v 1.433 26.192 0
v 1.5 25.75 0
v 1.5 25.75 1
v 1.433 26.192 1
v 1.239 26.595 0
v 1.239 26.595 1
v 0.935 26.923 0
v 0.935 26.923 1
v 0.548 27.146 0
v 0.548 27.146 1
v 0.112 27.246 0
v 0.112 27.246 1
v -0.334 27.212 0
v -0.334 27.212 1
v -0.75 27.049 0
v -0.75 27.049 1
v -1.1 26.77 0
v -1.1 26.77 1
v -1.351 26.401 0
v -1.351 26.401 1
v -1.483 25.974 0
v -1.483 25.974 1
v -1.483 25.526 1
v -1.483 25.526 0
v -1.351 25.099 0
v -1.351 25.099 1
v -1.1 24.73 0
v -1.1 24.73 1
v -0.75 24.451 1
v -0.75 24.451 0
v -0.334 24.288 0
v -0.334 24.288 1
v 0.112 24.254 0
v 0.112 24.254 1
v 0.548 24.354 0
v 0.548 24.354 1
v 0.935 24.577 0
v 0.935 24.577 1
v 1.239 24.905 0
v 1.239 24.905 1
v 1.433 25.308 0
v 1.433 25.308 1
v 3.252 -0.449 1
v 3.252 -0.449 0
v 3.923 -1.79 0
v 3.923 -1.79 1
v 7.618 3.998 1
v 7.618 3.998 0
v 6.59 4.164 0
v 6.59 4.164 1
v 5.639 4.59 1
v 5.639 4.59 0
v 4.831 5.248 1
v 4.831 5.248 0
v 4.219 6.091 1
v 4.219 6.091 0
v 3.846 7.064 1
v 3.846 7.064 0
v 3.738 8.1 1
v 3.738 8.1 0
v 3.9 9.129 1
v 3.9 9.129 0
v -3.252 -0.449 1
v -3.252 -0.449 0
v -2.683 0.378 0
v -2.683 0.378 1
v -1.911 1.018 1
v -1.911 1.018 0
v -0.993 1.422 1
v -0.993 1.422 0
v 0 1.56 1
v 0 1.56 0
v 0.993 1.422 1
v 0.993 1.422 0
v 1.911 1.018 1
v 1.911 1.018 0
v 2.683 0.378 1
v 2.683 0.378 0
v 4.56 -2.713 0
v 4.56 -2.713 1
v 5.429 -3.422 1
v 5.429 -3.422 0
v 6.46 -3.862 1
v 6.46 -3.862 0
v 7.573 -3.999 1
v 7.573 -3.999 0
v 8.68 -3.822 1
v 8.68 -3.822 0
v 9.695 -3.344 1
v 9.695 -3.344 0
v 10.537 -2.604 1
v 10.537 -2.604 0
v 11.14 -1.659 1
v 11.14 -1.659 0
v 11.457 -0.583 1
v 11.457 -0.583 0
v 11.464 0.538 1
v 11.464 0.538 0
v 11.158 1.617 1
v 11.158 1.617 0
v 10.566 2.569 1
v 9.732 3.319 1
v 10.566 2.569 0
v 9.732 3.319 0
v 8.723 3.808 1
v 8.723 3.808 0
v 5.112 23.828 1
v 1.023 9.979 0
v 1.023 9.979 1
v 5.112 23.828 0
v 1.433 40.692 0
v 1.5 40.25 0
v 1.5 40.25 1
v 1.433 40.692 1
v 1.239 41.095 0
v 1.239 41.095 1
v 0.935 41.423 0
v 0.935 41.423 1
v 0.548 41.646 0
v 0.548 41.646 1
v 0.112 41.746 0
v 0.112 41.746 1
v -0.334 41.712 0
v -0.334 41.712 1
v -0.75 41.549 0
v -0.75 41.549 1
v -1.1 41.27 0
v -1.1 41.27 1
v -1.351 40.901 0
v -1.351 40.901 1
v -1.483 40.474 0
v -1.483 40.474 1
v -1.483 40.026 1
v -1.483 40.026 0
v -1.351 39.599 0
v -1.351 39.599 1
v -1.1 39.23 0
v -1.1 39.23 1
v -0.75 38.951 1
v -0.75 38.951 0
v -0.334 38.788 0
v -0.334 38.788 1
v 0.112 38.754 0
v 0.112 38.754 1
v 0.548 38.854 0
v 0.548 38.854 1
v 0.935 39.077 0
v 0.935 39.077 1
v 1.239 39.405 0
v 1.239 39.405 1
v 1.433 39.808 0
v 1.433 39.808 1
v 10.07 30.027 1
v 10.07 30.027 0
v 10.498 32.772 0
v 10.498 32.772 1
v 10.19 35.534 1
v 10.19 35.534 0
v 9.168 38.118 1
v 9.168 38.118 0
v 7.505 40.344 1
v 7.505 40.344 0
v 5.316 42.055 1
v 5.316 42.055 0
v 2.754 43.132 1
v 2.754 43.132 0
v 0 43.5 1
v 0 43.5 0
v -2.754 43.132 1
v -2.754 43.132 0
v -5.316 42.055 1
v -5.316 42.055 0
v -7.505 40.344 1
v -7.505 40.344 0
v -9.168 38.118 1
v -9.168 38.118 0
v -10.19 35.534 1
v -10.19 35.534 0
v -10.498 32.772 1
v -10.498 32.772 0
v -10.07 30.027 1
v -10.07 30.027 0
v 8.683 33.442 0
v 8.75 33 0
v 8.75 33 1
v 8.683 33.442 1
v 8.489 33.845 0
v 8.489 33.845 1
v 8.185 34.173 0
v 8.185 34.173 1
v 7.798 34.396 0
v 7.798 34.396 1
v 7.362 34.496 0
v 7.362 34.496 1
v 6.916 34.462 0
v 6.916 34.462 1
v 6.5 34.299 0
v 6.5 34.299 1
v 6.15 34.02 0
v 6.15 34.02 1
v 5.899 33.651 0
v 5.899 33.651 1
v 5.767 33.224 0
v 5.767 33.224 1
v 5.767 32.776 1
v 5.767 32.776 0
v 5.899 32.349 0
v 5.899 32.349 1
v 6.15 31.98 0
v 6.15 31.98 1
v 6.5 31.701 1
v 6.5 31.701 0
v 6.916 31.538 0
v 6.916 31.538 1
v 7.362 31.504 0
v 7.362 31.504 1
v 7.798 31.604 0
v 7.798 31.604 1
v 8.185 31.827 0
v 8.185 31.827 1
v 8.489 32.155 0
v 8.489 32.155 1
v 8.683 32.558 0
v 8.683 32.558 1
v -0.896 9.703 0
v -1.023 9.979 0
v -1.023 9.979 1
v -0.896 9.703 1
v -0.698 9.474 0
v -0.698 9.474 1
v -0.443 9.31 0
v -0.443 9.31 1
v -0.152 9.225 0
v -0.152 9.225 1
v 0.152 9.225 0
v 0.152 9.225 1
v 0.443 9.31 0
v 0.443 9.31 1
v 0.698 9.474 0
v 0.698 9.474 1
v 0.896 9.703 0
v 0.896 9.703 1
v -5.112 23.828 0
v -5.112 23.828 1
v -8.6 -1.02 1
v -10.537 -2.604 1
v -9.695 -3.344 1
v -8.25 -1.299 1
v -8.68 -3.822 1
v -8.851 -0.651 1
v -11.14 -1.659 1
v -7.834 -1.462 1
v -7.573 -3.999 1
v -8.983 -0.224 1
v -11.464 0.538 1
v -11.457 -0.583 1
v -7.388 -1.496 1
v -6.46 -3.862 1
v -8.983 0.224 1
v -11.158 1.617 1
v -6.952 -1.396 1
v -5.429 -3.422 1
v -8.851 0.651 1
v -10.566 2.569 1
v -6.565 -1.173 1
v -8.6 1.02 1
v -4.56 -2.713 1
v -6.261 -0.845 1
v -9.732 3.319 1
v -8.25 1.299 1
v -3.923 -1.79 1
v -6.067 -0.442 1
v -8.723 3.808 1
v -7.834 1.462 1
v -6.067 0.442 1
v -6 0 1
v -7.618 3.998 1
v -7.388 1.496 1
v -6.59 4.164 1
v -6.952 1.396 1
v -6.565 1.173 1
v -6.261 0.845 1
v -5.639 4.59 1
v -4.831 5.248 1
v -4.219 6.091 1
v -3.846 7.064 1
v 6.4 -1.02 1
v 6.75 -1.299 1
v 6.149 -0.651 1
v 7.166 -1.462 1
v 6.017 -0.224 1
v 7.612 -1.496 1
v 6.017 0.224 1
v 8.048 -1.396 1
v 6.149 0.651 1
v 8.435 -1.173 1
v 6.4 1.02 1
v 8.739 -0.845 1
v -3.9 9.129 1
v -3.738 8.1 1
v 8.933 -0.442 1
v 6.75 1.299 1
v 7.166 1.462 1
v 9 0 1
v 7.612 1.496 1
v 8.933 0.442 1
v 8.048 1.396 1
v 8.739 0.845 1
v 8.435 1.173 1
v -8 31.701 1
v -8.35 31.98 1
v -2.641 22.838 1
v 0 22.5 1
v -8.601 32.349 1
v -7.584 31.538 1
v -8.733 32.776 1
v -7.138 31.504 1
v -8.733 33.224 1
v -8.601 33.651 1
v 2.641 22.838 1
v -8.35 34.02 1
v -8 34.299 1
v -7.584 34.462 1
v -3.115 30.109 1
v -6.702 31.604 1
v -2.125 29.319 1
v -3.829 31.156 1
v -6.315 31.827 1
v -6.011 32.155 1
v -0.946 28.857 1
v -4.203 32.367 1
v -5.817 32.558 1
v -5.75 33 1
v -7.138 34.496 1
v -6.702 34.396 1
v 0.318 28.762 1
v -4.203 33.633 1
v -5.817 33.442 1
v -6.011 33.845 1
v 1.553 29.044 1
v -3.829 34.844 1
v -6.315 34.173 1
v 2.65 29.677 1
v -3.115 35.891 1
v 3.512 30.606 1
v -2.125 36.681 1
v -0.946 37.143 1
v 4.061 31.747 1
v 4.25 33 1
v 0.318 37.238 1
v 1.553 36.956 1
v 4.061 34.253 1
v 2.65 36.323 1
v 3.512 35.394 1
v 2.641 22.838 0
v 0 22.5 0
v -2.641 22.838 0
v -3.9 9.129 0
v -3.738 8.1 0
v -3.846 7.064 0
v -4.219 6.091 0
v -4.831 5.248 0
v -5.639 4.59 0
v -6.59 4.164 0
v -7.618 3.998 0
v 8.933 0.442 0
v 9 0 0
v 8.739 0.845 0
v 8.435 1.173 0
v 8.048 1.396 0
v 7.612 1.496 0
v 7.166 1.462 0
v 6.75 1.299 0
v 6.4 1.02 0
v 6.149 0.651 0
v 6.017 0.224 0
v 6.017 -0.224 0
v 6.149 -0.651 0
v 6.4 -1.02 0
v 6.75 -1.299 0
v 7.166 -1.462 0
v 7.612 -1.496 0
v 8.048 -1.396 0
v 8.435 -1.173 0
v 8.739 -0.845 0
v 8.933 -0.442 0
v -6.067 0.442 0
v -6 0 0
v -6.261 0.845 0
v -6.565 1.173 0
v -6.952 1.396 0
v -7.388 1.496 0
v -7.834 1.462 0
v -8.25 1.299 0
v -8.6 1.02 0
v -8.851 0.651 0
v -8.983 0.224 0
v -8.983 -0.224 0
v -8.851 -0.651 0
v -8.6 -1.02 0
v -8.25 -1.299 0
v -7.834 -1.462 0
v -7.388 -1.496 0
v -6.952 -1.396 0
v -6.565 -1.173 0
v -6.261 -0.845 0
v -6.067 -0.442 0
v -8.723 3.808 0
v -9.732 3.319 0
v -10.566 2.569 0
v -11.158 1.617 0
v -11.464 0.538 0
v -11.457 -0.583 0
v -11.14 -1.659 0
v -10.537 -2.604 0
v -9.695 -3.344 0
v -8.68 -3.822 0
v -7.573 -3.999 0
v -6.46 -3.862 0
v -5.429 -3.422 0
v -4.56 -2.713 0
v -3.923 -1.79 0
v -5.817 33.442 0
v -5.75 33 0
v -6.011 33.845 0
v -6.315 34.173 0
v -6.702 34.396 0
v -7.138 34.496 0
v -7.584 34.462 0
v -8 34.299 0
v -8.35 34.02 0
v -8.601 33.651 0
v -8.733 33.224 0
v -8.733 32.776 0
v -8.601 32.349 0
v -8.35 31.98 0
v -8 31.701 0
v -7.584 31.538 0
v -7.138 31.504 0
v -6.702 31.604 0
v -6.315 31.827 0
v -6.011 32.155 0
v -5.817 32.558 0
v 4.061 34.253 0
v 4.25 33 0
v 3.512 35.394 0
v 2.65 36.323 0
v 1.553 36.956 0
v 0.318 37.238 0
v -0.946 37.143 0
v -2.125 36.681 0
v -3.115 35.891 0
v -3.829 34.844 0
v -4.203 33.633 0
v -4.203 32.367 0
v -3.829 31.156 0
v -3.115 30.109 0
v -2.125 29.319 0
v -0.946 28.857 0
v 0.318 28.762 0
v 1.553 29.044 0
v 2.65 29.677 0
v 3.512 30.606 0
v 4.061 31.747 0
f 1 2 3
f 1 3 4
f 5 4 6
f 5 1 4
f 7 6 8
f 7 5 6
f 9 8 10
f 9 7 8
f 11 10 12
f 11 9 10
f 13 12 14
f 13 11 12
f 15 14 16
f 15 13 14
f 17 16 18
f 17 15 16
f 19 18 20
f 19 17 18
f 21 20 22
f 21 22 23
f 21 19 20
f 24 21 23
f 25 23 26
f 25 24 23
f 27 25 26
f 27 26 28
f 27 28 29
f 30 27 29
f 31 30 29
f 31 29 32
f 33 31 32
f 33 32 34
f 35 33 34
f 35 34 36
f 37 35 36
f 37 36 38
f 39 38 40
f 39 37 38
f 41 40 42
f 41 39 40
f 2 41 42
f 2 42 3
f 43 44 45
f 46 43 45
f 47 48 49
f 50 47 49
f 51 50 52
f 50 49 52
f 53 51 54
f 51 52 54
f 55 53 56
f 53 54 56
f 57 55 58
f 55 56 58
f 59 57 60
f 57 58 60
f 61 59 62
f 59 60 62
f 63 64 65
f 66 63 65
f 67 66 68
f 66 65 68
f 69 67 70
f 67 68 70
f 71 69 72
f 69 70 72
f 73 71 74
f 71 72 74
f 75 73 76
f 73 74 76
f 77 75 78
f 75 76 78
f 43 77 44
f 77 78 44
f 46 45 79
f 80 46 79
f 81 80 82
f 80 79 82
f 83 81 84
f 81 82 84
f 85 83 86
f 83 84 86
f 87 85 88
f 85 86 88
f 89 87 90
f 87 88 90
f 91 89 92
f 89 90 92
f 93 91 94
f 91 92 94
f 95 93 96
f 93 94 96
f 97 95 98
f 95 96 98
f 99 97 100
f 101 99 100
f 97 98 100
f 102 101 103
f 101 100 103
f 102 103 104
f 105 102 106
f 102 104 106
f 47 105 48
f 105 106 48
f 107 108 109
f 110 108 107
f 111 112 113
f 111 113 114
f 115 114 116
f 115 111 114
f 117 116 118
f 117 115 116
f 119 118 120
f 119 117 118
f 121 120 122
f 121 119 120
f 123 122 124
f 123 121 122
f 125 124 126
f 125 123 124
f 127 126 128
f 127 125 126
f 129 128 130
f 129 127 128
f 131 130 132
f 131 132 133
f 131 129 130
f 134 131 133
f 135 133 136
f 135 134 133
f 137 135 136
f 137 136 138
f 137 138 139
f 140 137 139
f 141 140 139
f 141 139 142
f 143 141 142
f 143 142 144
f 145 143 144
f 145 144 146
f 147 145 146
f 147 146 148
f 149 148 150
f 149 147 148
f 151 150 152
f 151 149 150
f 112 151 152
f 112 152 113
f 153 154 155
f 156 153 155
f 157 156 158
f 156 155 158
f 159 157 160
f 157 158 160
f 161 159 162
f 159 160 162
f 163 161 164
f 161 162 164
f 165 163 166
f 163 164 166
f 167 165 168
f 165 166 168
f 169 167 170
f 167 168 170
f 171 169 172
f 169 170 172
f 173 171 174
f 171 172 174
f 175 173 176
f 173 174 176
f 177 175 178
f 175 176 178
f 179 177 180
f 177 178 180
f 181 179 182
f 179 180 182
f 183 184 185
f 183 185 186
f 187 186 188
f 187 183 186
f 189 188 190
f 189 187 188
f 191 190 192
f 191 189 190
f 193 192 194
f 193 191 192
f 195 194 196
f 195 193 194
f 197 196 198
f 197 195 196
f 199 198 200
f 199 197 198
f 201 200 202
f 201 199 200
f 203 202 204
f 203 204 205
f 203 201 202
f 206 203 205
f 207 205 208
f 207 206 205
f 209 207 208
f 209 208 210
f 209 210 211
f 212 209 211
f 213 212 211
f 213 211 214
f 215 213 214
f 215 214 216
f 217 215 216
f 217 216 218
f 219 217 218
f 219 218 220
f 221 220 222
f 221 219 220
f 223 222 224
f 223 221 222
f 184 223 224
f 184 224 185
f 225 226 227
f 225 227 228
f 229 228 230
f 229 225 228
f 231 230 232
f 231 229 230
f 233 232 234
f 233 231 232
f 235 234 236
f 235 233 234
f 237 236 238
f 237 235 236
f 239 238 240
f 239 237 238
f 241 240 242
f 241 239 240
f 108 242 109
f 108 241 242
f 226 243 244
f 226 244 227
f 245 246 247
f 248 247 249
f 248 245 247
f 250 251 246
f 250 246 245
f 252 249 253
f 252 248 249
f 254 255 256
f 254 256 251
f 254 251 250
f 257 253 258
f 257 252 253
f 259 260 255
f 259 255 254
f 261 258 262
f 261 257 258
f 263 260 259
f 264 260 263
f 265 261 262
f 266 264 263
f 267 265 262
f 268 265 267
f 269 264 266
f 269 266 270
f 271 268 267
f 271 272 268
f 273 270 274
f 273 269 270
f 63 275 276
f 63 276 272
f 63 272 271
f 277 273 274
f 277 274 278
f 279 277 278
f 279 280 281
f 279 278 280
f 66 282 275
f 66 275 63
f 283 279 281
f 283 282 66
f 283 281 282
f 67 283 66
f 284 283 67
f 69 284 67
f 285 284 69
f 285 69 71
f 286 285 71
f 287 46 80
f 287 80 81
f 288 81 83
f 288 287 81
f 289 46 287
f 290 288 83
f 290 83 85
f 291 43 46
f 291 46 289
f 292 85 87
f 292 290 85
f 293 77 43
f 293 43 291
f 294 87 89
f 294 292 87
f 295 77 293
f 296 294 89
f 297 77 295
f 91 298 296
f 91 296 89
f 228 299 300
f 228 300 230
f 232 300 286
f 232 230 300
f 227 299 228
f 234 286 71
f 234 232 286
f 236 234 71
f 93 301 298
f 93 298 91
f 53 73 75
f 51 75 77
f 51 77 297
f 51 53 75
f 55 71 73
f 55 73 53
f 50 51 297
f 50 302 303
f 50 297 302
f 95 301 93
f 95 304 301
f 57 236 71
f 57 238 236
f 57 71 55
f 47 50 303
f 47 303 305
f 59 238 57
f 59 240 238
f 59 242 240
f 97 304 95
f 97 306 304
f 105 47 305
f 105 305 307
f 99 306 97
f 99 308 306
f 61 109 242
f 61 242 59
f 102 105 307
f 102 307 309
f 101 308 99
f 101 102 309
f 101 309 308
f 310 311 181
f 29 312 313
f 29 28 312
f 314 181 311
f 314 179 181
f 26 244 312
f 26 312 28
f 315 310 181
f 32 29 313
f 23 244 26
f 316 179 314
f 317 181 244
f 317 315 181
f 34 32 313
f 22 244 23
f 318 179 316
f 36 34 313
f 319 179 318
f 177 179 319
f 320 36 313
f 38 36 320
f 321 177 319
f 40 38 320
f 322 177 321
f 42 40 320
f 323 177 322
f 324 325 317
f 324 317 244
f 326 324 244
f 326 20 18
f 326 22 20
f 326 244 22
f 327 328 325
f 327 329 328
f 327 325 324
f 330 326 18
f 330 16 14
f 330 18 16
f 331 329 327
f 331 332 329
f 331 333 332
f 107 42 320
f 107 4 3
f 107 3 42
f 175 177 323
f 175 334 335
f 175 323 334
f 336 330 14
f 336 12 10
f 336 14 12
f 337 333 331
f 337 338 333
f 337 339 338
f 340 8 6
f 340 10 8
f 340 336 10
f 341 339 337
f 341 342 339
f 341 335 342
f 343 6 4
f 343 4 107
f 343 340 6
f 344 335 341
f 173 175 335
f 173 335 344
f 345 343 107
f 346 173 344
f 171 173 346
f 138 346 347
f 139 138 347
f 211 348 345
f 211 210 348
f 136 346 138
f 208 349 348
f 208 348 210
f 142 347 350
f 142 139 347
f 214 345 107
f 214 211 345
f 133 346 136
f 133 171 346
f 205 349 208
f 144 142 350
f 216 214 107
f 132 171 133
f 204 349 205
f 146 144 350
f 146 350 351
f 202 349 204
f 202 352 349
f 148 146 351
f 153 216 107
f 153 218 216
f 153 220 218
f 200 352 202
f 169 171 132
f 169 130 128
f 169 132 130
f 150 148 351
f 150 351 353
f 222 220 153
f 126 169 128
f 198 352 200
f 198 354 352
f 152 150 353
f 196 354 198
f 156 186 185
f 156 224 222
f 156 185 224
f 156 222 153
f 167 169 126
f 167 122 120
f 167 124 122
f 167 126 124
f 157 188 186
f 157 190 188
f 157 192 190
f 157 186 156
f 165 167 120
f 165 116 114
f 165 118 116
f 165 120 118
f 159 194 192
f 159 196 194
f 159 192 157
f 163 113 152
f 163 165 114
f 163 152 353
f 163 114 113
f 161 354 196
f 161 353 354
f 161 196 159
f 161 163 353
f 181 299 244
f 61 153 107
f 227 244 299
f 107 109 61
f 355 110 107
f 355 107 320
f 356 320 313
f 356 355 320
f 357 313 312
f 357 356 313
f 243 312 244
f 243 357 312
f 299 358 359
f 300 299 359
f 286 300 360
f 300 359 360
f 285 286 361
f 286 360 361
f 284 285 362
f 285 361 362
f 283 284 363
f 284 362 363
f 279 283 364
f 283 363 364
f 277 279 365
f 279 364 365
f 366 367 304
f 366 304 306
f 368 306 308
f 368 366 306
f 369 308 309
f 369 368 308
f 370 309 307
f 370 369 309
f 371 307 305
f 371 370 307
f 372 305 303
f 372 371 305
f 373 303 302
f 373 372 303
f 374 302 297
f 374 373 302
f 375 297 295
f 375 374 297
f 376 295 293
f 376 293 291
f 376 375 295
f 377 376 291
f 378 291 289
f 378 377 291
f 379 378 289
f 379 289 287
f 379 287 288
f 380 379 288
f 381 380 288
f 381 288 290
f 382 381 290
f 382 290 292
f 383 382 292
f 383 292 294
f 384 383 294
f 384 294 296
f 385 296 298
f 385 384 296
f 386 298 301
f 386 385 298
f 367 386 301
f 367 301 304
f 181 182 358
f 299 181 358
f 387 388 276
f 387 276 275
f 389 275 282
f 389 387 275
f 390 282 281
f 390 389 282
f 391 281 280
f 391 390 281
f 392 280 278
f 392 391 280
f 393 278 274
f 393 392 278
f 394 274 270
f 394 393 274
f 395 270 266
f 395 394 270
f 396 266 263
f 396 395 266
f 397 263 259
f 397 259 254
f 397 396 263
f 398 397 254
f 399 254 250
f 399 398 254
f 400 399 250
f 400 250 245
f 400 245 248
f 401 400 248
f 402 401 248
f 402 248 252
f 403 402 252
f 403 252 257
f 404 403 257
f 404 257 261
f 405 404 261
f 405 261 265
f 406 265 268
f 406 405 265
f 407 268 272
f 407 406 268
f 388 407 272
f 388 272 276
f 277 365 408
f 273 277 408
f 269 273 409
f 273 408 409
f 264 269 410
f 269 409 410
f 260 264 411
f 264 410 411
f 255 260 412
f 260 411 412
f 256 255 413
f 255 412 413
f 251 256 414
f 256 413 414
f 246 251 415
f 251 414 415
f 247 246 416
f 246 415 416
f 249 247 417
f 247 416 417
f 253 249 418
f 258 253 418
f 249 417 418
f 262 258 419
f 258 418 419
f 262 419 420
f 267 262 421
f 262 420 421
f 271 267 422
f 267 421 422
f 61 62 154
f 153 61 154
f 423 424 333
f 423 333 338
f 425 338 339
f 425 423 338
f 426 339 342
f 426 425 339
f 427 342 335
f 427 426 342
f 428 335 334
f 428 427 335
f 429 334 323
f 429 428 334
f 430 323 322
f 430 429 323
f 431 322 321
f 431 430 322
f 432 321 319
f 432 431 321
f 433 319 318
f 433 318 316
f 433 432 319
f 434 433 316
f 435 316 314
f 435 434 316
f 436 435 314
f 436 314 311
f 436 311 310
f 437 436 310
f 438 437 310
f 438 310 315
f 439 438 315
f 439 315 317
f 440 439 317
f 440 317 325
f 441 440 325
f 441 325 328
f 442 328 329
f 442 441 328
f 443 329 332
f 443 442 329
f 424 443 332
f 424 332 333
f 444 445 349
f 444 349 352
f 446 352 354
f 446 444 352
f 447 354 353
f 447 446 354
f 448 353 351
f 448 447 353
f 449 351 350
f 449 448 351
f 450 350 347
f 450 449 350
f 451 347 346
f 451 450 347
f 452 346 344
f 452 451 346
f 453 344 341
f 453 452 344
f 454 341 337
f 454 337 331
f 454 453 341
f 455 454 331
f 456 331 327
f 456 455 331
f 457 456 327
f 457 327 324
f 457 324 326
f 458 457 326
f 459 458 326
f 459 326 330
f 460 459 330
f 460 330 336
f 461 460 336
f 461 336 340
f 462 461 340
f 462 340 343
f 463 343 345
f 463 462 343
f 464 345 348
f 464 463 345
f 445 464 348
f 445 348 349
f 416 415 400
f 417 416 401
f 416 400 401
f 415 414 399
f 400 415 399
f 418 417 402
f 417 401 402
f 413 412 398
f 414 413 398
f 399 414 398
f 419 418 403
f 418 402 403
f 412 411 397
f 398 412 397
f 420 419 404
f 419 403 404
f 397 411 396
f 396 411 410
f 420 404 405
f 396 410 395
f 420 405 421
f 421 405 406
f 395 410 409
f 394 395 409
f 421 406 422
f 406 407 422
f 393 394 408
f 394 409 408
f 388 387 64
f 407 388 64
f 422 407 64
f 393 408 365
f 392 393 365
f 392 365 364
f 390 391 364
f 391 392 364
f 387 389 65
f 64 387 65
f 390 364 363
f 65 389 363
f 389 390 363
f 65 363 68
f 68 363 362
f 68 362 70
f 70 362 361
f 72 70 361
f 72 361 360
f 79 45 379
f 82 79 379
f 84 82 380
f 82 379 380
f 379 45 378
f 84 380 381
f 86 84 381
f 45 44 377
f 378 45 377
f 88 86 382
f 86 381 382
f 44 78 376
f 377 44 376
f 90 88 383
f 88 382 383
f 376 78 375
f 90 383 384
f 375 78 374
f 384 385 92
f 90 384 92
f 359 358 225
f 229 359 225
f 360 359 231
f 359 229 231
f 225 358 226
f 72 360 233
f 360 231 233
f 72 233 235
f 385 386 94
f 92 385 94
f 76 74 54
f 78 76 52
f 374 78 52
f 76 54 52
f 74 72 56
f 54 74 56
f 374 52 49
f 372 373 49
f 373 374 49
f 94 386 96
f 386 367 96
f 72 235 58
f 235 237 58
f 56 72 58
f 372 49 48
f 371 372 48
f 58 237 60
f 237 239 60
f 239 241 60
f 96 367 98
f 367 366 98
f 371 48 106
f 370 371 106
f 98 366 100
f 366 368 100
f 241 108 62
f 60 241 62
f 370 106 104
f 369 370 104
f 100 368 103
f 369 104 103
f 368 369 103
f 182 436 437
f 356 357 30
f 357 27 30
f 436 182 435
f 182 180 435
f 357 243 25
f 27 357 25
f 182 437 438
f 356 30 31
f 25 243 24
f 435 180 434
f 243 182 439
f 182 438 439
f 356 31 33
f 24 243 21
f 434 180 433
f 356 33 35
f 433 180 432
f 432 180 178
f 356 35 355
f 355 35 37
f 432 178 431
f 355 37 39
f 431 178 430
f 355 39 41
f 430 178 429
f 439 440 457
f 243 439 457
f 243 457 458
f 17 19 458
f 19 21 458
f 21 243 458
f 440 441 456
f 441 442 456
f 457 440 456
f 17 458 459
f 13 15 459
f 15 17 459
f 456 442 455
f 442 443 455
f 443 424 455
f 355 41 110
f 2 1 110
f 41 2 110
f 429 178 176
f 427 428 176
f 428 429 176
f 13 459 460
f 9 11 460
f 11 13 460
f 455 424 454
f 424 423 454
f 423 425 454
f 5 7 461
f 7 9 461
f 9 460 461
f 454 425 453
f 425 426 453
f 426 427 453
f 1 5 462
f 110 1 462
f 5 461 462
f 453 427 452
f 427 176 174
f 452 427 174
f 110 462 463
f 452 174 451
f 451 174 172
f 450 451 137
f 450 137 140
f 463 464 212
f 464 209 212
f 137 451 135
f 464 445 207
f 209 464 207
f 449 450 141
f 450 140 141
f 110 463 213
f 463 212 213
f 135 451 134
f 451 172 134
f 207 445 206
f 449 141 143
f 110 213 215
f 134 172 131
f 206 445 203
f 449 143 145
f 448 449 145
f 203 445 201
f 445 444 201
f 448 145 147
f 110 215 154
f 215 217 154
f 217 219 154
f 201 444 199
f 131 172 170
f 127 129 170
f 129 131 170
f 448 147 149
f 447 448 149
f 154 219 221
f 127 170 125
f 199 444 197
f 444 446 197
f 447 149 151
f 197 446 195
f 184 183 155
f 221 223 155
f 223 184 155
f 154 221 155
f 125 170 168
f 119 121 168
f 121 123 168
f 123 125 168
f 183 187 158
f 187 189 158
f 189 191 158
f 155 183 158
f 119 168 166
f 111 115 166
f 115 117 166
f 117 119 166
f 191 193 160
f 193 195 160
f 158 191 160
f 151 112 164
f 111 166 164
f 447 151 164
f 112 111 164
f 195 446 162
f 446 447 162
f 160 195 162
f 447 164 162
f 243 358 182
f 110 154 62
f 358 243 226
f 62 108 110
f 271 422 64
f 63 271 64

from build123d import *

# Parameters (mm, degrees)
SKETCH_1_R      = 1.5
SKETCH_1_R_2    = 4.25
EXTRUDE_1_DEPTH = 1


with BuildPart() as part:
    # 草图1 → 凸台-拉伸1 (new body)
    with BuildSketch(Plane.XY):
        with BuildLine():
            Line((-10.070213397, 30.026651359), (-3.9, 9.129214461))
            ThreePointArc((-3.9, 9.129214461), (-4.497287215, 5.649388777), (-7.618135885, 3.998255109))
            ThreePointArc((-7.618135885, 3.998255109), (-10.871519118, -2.152407684), (-3.922863507, -1.789998466))
            Line((-3.922863507, -1.789998466), (-3.251614082, -0.448572281))
            ThreePointArc((-3.251614082, -0.448572281), (0, 1.560317266), (3.251614082, -0.448572281))
            Line((3.251614082, -0.448572281), (3.922863507, -1.789998466))
            ThreePointArc((3.922863507, -1.789998466), (10.871519118, -2.152407684), (7.618135885, 3.998255109))
            ThreePointArc((7.618135885, 3.998255109), (4.497287215, 5.649388777), (3.9, 9.129214461))
            Line((3.9, 9.129214461), (10.070213397, 30.026651359))
            ThreePointArc((10.070213397, 30.026651359), (0, 43.5), (-10.070213397, 30.026651359))
        make_face()
        with Locations((-7.5, 0)):
            Circle(SKETCH_1_R, mode=Mode.SUBTRACT)
        with Locations((7.5, 0)):
            Circle(SKETCH_1_R, mode=Mode.SUBTRACT)
        with Locations((0, 33)):
            Circle(SKETCH_1_R_2, mode=Mode.SUBTRACT)
        with Locations((0, 40.25)):
            Circle(SKETCH_1_R, mode=Mode.SUBTRACT)
        with Locations((-7.25, 33)):
            Circle(SKETCH_1_R, mode=Mode.SUBTRACT)
        with Locations((0, 25.75)):
            Circle(SKETCH_1_R, mode=Mode.SUBTRACT)
        with Locations((7.25, 33)):
            Circle(SKETCH_1_R, mode=Mode.SUBTRACT)
        with BuildLine():
            Line((-5.112098998, 23.828498278), (-1.022796172, 9.978742645))
            ThreePointArc((-1.022796172, 9.978742645), (0, 9.214287127), (1.022796172, 9.978742645))
            Line((1.022796172, 9.978742645), (5.112098998, 23.828498278))
            ThreePointArc((5.112098998, 23.828498278), (0, 22.5), (-5.112098998, 23.828498278))
        make_face(mode=Mode.SUBTRACT)
    extrude(amount=EXTRUDE_1_DEPTH)


solid = part.part
